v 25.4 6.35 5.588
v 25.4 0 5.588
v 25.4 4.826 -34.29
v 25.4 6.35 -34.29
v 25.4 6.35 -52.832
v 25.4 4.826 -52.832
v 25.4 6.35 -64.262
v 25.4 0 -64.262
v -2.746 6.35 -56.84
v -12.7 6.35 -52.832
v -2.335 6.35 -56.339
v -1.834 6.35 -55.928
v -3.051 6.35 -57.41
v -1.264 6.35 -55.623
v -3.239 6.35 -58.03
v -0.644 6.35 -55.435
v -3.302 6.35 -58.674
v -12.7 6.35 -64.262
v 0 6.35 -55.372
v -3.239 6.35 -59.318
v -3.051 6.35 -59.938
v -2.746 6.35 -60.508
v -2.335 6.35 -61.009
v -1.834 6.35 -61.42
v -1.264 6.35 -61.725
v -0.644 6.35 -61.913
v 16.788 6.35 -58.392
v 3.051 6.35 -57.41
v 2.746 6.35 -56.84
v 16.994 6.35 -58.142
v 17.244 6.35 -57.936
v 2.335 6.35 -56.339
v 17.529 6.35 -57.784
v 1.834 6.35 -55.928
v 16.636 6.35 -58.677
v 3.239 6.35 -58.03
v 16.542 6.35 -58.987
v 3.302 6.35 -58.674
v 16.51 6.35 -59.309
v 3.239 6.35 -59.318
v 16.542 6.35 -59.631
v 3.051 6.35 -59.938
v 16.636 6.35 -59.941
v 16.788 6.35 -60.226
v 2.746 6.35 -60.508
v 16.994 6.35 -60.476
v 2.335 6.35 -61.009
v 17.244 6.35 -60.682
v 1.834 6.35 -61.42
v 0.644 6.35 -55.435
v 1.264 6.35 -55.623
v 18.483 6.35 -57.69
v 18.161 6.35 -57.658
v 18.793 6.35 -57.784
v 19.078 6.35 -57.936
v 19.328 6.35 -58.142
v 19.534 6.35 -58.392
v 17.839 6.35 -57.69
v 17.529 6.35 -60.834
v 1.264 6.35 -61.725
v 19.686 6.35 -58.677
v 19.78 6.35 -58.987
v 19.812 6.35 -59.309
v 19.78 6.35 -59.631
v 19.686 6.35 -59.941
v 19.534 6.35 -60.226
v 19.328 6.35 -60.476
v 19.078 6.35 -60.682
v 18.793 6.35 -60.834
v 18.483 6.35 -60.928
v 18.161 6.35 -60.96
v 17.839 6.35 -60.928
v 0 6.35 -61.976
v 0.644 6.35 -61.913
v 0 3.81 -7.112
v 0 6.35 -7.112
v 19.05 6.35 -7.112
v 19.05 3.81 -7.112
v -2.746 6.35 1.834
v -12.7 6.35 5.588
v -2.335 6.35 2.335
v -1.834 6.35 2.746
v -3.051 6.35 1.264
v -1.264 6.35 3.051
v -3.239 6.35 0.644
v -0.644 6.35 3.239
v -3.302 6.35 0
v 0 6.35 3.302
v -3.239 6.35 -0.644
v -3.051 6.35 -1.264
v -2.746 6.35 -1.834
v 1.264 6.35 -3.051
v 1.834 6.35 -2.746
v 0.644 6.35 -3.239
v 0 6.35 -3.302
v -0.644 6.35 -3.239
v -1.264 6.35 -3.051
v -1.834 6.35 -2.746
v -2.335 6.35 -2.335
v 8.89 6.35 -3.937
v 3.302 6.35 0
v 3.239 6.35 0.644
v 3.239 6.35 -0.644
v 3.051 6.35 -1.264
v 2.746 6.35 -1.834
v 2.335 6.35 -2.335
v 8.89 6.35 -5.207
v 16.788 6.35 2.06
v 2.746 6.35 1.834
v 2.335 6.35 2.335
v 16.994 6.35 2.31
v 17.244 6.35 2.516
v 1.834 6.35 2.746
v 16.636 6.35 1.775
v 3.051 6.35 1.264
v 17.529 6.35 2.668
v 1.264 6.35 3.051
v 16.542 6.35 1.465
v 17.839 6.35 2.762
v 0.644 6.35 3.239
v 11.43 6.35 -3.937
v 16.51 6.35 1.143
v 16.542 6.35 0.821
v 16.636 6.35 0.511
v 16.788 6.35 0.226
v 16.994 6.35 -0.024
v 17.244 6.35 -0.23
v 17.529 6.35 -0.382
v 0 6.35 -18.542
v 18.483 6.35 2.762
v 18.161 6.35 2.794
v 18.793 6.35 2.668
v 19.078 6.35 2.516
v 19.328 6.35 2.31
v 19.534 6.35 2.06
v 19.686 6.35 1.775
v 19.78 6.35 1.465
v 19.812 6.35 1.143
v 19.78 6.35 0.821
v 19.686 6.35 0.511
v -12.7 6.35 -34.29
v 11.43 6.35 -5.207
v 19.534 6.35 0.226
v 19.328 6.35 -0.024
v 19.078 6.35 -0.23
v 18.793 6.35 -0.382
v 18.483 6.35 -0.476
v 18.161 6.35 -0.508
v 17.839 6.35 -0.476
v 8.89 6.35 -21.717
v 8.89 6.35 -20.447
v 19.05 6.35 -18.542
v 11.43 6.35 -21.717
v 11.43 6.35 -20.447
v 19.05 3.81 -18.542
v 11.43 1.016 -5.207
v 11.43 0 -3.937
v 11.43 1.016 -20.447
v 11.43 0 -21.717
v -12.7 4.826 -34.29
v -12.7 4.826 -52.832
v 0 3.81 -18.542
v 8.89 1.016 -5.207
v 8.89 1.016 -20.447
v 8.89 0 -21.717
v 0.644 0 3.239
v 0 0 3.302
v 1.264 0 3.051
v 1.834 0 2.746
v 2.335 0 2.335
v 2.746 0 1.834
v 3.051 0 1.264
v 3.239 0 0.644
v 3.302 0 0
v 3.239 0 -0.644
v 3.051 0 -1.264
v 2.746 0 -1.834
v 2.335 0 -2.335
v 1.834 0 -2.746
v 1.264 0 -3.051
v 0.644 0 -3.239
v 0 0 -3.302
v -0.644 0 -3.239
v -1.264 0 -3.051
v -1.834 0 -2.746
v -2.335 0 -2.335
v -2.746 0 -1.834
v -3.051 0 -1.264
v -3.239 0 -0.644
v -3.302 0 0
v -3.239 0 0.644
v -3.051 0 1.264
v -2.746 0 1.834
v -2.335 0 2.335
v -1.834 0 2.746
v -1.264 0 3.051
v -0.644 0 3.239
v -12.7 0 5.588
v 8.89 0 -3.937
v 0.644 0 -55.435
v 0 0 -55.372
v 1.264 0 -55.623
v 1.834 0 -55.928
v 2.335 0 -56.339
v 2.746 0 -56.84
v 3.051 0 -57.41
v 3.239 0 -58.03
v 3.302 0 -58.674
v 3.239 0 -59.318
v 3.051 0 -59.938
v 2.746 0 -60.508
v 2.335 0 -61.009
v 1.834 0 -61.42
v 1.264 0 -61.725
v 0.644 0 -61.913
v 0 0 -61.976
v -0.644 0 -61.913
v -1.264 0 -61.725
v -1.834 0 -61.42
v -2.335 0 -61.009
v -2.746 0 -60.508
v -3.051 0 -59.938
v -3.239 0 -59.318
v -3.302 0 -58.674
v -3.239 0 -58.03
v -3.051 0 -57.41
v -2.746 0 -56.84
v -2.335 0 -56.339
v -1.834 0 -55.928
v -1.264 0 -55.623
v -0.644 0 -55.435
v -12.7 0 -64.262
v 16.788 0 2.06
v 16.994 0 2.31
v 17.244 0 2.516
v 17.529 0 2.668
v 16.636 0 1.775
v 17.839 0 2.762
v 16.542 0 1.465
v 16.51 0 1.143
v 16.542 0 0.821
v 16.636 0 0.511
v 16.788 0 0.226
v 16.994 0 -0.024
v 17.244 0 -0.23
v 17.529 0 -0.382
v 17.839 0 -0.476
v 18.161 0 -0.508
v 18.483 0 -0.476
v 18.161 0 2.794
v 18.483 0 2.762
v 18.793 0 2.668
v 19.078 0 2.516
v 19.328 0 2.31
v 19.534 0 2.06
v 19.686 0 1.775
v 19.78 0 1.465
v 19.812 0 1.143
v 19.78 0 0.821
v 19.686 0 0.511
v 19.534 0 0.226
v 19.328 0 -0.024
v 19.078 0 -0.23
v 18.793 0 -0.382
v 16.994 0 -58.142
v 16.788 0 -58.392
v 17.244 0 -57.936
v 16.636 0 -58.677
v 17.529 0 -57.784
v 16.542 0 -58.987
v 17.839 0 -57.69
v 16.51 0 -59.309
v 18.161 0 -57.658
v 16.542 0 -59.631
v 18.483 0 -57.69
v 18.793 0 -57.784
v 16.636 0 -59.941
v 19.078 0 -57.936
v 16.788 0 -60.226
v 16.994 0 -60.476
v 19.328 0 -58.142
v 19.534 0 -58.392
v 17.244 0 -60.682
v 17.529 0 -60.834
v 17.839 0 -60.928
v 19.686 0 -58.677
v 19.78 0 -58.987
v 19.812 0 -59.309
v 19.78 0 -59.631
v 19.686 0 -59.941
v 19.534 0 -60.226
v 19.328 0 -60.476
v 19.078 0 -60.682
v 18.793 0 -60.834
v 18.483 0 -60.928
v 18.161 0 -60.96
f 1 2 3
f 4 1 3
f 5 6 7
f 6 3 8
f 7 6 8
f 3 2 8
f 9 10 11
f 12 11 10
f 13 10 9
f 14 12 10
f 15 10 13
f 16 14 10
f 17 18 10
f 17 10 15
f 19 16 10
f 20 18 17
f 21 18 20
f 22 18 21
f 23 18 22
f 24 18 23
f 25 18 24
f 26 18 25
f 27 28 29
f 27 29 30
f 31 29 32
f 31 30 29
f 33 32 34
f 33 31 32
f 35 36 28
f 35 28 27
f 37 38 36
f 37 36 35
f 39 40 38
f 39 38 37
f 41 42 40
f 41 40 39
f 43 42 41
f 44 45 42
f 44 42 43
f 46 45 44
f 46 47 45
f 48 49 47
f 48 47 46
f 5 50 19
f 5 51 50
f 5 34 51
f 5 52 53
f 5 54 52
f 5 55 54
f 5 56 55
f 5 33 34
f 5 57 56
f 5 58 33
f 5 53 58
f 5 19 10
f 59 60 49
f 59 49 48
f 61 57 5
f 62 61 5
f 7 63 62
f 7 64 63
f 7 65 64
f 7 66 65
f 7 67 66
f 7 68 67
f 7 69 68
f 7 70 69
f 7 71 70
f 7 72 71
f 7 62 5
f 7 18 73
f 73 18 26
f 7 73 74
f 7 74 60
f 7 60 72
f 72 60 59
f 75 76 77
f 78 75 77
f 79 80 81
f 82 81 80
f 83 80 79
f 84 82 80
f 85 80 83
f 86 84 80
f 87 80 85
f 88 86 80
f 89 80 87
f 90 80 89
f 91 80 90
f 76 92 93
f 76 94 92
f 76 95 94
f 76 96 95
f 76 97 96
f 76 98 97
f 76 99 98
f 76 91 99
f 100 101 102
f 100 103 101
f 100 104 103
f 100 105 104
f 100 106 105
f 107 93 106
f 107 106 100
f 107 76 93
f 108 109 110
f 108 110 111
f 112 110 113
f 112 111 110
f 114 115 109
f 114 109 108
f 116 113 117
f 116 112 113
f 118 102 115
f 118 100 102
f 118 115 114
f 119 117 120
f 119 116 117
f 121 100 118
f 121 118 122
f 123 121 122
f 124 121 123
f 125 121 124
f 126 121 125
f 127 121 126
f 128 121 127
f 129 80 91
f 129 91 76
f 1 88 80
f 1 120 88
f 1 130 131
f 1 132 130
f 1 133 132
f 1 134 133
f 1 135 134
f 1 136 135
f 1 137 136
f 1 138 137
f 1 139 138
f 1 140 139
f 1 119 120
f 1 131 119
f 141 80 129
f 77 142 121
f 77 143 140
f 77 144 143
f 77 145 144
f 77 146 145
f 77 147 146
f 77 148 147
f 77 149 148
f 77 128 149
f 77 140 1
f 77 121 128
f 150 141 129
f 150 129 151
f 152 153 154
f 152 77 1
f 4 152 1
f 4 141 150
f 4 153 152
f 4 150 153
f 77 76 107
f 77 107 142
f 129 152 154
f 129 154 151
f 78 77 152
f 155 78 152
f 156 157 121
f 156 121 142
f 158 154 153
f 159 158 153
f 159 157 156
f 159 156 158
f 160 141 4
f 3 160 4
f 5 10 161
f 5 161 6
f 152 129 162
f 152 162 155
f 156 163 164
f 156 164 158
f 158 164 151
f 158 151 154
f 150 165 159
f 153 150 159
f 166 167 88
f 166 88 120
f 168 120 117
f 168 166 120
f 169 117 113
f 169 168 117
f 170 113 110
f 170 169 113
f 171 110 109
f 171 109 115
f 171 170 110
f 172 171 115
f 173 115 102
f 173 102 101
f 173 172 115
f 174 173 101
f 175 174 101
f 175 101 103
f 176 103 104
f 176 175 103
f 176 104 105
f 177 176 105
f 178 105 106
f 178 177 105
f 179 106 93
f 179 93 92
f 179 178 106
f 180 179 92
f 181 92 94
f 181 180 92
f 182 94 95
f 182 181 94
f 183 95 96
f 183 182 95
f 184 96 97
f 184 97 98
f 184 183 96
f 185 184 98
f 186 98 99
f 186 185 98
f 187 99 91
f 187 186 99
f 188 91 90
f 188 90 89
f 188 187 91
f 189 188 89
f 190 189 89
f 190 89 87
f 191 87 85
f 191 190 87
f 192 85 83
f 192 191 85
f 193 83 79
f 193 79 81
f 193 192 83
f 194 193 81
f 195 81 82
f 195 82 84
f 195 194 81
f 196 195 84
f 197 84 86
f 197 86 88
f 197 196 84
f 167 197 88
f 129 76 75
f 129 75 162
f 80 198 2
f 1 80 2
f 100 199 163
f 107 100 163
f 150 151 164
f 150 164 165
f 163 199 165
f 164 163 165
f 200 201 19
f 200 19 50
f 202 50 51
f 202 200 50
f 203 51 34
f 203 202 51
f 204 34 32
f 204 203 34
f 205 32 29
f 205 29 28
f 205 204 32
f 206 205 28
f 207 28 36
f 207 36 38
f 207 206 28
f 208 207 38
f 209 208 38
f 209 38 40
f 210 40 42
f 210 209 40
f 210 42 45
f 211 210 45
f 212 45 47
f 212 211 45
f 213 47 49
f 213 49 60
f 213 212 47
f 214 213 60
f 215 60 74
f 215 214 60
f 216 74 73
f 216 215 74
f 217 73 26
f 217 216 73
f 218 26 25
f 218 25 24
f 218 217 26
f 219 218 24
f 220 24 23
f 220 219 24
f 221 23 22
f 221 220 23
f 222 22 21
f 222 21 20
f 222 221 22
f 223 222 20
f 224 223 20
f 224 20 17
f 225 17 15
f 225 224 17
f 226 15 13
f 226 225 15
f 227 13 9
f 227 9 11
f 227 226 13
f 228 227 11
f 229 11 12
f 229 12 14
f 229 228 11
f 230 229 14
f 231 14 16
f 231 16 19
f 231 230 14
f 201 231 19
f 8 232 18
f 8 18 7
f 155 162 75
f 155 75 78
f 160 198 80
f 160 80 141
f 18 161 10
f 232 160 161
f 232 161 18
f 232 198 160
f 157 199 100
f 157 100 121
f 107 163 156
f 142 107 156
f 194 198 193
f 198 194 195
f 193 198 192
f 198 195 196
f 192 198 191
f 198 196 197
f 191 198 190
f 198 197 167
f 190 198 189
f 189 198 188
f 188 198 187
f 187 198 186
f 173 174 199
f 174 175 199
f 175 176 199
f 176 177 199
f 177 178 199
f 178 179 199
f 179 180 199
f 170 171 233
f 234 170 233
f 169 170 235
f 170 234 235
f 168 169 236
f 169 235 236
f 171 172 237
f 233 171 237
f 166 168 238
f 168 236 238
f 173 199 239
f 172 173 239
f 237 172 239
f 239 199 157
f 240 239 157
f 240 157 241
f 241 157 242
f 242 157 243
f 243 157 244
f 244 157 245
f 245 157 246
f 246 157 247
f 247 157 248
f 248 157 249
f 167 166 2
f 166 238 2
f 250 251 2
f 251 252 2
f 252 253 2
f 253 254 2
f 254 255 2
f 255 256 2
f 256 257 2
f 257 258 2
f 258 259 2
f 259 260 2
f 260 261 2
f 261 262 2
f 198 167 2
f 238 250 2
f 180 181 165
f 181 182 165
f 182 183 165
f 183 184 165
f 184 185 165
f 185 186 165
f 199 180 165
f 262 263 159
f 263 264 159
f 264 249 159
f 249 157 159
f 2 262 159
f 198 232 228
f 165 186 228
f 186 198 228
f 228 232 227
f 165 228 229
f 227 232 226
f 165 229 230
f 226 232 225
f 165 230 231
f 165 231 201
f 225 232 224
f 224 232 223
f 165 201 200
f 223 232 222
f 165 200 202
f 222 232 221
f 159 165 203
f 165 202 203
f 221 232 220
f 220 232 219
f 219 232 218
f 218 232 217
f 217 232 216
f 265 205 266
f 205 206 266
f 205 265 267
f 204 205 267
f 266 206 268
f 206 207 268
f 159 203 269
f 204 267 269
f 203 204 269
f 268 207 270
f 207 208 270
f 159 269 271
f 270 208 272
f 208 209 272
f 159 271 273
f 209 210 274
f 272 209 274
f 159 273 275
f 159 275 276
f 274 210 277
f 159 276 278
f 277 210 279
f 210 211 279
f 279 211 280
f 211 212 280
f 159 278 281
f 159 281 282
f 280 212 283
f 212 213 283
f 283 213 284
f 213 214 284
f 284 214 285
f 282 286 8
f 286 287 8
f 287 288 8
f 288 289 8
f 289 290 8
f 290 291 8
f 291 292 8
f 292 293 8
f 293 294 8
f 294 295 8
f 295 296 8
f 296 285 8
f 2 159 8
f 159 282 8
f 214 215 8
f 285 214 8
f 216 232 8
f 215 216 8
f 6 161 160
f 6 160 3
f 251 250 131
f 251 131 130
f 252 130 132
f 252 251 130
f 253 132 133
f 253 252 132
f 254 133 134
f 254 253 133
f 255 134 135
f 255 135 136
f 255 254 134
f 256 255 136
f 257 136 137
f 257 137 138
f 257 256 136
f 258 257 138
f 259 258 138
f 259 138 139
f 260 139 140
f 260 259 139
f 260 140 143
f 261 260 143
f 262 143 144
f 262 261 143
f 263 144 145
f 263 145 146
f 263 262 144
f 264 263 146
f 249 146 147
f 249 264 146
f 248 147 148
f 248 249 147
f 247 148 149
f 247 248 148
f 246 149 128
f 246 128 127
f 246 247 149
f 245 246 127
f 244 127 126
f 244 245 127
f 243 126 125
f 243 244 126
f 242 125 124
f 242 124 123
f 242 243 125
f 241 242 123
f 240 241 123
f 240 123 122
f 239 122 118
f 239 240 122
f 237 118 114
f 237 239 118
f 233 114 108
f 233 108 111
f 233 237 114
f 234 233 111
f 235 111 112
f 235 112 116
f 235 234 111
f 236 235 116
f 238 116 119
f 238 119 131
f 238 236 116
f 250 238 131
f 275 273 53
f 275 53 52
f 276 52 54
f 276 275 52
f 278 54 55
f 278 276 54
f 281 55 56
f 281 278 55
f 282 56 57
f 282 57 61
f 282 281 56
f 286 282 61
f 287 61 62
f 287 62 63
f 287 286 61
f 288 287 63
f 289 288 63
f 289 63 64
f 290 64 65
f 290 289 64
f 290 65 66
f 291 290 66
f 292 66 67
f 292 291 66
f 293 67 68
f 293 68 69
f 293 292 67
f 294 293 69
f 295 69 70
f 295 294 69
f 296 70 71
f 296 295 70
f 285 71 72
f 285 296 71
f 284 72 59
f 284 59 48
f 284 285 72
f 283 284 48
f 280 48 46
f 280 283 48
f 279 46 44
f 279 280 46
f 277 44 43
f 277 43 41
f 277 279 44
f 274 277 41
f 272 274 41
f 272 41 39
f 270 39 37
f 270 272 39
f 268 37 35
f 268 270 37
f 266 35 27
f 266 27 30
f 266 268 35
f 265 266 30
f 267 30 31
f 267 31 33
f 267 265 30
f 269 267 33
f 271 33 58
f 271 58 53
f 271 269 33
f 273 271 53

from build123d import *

# Parameters (mm, degrees)
SKETCH1_W               = 38.1
SKETCH1_H               = 69.85
SKETCH1_R               = 3.302
SKETCH1_R_2             = 1.651
BOSS_EXTRUDE1_DEPTH     = 6.35
SKETCH2_W               = 19.05
SKETCH2_H               = 11.43
CUT_EXTRUDE1_DEPTH      = 2.54
CUT_EXTRUDE2_DEPTH      = 70.390828962
CUT_EXTRUDE2_DEPTH_BACK = 70.390828962
SKETCH5_W               = 2.54
SKETCH5_H               = 1.27
SKETCH6_W               = 2.54
SKETCH6_H               = 15.24
CUT_EXTRUDE3_DEPTH      = 1.016
SKETCH7_W               = 38.1
SKETCH7_H               = 18.542
CUT_EXTRUDE4_DEPTH      = 1.524


with BuildPart() as part:
    # Sketch1 → Boss-Extrude1 (new body)
    with BuildSketch(Plane(origin=(0, 0, 0), x_dir=(1, 0, 0), z_dir=(0, 1, 0))):
        with Locations((6.35, 29.337)):
            Rectangle(SKETCH1_W, SKETCH1_H)
        with Locations(Location((0, 0, 0), (0, 0, 270))):
            Circle(SKETCH1_R, mode=Mode.SUBTRACT)
        with Locations(Location((0, 58.674, 0), (0, 0, 270))):
            Circle(SKETCH1_R, mode=Mode.SUBTRACT)
        with Locations(Location((18.161, 59.309, 0), (0, 0, 270))):
            Circle(SKETCH1_R_2, mode=Mode.SUBTRACT)
        with Locations(Location((18.161, -1.143, 0), (0, 0, 270))):
            Circle(SKETCH1_R_2, mode=Mode.SUBTRACT)
    extrude(amount=BOSS_EXTRUDE1_DEPTH)

    # Sketch2 → Cut-Extrude1 (cut)
    with BuildSketch(Plane(origin=(0, 6.35, 0), x_dir=(1, 0, 0), z_dir=(0, 1, 0))):
        with Locations((9.525, 12.827)):
            Rectangle(SKETCH2_W, SKETCH2_H)
    extrude(amount=-CUT_EXTRUDE1_DEPTH, mode=Mode.SUBTRACT)

    # Sketch5 → Cut-Extrude2 (cut, two sides: drawn at the far end of the back side and taken through both)
    with BuildSketch(Plane(origin=(0, 6.35, 0), x_dir=(1, 0, 0), z_dir=(0, 1, 0)).offset(-CUT_EXTRUDE2_DEPTH_BACK)):
        with Locations((10.16, 21.082)):
            Rectangle(SKETCH5_W, SKETCH5_H)
        with Locations((10.16, 4.572)):
            Rectangle(SKETCH5_W, SKETCH5_H)
    extrude(amount=CUT_EXTRUDE2_DEPTH + CUT_EXTRUDE2_DEPTH_BACK, mode=Mode.SUBTRACT)

    # Sketch6 → Cut-Extrude3 (cut)
    with BuildSketch(Plane.XZ):
        with Locations((10.16, -12.827)):
            Rectangle(SKETCH6_W, SKETCH6_H)
    extrude(amount=-CUT_EXTRUDE3_DEPTH, mode=Mode.SUBTRACT)

    # Sketch7 → Cut-Extrude4 (cut)
    with BuildSketch(Plane(origin=(0, 6.35, 0), x_dir=(1, 0, 0), z_dir=(0, 1, 0))):
        with Locations((6.35, 43.561)):
            Rectangle(SKETCH7_W, SKETCH7_H)
    extrude(amount=-CUT_EXTRUDE4_DEPTH, mode=Mode.SUBTRACT)


solid = part.part
